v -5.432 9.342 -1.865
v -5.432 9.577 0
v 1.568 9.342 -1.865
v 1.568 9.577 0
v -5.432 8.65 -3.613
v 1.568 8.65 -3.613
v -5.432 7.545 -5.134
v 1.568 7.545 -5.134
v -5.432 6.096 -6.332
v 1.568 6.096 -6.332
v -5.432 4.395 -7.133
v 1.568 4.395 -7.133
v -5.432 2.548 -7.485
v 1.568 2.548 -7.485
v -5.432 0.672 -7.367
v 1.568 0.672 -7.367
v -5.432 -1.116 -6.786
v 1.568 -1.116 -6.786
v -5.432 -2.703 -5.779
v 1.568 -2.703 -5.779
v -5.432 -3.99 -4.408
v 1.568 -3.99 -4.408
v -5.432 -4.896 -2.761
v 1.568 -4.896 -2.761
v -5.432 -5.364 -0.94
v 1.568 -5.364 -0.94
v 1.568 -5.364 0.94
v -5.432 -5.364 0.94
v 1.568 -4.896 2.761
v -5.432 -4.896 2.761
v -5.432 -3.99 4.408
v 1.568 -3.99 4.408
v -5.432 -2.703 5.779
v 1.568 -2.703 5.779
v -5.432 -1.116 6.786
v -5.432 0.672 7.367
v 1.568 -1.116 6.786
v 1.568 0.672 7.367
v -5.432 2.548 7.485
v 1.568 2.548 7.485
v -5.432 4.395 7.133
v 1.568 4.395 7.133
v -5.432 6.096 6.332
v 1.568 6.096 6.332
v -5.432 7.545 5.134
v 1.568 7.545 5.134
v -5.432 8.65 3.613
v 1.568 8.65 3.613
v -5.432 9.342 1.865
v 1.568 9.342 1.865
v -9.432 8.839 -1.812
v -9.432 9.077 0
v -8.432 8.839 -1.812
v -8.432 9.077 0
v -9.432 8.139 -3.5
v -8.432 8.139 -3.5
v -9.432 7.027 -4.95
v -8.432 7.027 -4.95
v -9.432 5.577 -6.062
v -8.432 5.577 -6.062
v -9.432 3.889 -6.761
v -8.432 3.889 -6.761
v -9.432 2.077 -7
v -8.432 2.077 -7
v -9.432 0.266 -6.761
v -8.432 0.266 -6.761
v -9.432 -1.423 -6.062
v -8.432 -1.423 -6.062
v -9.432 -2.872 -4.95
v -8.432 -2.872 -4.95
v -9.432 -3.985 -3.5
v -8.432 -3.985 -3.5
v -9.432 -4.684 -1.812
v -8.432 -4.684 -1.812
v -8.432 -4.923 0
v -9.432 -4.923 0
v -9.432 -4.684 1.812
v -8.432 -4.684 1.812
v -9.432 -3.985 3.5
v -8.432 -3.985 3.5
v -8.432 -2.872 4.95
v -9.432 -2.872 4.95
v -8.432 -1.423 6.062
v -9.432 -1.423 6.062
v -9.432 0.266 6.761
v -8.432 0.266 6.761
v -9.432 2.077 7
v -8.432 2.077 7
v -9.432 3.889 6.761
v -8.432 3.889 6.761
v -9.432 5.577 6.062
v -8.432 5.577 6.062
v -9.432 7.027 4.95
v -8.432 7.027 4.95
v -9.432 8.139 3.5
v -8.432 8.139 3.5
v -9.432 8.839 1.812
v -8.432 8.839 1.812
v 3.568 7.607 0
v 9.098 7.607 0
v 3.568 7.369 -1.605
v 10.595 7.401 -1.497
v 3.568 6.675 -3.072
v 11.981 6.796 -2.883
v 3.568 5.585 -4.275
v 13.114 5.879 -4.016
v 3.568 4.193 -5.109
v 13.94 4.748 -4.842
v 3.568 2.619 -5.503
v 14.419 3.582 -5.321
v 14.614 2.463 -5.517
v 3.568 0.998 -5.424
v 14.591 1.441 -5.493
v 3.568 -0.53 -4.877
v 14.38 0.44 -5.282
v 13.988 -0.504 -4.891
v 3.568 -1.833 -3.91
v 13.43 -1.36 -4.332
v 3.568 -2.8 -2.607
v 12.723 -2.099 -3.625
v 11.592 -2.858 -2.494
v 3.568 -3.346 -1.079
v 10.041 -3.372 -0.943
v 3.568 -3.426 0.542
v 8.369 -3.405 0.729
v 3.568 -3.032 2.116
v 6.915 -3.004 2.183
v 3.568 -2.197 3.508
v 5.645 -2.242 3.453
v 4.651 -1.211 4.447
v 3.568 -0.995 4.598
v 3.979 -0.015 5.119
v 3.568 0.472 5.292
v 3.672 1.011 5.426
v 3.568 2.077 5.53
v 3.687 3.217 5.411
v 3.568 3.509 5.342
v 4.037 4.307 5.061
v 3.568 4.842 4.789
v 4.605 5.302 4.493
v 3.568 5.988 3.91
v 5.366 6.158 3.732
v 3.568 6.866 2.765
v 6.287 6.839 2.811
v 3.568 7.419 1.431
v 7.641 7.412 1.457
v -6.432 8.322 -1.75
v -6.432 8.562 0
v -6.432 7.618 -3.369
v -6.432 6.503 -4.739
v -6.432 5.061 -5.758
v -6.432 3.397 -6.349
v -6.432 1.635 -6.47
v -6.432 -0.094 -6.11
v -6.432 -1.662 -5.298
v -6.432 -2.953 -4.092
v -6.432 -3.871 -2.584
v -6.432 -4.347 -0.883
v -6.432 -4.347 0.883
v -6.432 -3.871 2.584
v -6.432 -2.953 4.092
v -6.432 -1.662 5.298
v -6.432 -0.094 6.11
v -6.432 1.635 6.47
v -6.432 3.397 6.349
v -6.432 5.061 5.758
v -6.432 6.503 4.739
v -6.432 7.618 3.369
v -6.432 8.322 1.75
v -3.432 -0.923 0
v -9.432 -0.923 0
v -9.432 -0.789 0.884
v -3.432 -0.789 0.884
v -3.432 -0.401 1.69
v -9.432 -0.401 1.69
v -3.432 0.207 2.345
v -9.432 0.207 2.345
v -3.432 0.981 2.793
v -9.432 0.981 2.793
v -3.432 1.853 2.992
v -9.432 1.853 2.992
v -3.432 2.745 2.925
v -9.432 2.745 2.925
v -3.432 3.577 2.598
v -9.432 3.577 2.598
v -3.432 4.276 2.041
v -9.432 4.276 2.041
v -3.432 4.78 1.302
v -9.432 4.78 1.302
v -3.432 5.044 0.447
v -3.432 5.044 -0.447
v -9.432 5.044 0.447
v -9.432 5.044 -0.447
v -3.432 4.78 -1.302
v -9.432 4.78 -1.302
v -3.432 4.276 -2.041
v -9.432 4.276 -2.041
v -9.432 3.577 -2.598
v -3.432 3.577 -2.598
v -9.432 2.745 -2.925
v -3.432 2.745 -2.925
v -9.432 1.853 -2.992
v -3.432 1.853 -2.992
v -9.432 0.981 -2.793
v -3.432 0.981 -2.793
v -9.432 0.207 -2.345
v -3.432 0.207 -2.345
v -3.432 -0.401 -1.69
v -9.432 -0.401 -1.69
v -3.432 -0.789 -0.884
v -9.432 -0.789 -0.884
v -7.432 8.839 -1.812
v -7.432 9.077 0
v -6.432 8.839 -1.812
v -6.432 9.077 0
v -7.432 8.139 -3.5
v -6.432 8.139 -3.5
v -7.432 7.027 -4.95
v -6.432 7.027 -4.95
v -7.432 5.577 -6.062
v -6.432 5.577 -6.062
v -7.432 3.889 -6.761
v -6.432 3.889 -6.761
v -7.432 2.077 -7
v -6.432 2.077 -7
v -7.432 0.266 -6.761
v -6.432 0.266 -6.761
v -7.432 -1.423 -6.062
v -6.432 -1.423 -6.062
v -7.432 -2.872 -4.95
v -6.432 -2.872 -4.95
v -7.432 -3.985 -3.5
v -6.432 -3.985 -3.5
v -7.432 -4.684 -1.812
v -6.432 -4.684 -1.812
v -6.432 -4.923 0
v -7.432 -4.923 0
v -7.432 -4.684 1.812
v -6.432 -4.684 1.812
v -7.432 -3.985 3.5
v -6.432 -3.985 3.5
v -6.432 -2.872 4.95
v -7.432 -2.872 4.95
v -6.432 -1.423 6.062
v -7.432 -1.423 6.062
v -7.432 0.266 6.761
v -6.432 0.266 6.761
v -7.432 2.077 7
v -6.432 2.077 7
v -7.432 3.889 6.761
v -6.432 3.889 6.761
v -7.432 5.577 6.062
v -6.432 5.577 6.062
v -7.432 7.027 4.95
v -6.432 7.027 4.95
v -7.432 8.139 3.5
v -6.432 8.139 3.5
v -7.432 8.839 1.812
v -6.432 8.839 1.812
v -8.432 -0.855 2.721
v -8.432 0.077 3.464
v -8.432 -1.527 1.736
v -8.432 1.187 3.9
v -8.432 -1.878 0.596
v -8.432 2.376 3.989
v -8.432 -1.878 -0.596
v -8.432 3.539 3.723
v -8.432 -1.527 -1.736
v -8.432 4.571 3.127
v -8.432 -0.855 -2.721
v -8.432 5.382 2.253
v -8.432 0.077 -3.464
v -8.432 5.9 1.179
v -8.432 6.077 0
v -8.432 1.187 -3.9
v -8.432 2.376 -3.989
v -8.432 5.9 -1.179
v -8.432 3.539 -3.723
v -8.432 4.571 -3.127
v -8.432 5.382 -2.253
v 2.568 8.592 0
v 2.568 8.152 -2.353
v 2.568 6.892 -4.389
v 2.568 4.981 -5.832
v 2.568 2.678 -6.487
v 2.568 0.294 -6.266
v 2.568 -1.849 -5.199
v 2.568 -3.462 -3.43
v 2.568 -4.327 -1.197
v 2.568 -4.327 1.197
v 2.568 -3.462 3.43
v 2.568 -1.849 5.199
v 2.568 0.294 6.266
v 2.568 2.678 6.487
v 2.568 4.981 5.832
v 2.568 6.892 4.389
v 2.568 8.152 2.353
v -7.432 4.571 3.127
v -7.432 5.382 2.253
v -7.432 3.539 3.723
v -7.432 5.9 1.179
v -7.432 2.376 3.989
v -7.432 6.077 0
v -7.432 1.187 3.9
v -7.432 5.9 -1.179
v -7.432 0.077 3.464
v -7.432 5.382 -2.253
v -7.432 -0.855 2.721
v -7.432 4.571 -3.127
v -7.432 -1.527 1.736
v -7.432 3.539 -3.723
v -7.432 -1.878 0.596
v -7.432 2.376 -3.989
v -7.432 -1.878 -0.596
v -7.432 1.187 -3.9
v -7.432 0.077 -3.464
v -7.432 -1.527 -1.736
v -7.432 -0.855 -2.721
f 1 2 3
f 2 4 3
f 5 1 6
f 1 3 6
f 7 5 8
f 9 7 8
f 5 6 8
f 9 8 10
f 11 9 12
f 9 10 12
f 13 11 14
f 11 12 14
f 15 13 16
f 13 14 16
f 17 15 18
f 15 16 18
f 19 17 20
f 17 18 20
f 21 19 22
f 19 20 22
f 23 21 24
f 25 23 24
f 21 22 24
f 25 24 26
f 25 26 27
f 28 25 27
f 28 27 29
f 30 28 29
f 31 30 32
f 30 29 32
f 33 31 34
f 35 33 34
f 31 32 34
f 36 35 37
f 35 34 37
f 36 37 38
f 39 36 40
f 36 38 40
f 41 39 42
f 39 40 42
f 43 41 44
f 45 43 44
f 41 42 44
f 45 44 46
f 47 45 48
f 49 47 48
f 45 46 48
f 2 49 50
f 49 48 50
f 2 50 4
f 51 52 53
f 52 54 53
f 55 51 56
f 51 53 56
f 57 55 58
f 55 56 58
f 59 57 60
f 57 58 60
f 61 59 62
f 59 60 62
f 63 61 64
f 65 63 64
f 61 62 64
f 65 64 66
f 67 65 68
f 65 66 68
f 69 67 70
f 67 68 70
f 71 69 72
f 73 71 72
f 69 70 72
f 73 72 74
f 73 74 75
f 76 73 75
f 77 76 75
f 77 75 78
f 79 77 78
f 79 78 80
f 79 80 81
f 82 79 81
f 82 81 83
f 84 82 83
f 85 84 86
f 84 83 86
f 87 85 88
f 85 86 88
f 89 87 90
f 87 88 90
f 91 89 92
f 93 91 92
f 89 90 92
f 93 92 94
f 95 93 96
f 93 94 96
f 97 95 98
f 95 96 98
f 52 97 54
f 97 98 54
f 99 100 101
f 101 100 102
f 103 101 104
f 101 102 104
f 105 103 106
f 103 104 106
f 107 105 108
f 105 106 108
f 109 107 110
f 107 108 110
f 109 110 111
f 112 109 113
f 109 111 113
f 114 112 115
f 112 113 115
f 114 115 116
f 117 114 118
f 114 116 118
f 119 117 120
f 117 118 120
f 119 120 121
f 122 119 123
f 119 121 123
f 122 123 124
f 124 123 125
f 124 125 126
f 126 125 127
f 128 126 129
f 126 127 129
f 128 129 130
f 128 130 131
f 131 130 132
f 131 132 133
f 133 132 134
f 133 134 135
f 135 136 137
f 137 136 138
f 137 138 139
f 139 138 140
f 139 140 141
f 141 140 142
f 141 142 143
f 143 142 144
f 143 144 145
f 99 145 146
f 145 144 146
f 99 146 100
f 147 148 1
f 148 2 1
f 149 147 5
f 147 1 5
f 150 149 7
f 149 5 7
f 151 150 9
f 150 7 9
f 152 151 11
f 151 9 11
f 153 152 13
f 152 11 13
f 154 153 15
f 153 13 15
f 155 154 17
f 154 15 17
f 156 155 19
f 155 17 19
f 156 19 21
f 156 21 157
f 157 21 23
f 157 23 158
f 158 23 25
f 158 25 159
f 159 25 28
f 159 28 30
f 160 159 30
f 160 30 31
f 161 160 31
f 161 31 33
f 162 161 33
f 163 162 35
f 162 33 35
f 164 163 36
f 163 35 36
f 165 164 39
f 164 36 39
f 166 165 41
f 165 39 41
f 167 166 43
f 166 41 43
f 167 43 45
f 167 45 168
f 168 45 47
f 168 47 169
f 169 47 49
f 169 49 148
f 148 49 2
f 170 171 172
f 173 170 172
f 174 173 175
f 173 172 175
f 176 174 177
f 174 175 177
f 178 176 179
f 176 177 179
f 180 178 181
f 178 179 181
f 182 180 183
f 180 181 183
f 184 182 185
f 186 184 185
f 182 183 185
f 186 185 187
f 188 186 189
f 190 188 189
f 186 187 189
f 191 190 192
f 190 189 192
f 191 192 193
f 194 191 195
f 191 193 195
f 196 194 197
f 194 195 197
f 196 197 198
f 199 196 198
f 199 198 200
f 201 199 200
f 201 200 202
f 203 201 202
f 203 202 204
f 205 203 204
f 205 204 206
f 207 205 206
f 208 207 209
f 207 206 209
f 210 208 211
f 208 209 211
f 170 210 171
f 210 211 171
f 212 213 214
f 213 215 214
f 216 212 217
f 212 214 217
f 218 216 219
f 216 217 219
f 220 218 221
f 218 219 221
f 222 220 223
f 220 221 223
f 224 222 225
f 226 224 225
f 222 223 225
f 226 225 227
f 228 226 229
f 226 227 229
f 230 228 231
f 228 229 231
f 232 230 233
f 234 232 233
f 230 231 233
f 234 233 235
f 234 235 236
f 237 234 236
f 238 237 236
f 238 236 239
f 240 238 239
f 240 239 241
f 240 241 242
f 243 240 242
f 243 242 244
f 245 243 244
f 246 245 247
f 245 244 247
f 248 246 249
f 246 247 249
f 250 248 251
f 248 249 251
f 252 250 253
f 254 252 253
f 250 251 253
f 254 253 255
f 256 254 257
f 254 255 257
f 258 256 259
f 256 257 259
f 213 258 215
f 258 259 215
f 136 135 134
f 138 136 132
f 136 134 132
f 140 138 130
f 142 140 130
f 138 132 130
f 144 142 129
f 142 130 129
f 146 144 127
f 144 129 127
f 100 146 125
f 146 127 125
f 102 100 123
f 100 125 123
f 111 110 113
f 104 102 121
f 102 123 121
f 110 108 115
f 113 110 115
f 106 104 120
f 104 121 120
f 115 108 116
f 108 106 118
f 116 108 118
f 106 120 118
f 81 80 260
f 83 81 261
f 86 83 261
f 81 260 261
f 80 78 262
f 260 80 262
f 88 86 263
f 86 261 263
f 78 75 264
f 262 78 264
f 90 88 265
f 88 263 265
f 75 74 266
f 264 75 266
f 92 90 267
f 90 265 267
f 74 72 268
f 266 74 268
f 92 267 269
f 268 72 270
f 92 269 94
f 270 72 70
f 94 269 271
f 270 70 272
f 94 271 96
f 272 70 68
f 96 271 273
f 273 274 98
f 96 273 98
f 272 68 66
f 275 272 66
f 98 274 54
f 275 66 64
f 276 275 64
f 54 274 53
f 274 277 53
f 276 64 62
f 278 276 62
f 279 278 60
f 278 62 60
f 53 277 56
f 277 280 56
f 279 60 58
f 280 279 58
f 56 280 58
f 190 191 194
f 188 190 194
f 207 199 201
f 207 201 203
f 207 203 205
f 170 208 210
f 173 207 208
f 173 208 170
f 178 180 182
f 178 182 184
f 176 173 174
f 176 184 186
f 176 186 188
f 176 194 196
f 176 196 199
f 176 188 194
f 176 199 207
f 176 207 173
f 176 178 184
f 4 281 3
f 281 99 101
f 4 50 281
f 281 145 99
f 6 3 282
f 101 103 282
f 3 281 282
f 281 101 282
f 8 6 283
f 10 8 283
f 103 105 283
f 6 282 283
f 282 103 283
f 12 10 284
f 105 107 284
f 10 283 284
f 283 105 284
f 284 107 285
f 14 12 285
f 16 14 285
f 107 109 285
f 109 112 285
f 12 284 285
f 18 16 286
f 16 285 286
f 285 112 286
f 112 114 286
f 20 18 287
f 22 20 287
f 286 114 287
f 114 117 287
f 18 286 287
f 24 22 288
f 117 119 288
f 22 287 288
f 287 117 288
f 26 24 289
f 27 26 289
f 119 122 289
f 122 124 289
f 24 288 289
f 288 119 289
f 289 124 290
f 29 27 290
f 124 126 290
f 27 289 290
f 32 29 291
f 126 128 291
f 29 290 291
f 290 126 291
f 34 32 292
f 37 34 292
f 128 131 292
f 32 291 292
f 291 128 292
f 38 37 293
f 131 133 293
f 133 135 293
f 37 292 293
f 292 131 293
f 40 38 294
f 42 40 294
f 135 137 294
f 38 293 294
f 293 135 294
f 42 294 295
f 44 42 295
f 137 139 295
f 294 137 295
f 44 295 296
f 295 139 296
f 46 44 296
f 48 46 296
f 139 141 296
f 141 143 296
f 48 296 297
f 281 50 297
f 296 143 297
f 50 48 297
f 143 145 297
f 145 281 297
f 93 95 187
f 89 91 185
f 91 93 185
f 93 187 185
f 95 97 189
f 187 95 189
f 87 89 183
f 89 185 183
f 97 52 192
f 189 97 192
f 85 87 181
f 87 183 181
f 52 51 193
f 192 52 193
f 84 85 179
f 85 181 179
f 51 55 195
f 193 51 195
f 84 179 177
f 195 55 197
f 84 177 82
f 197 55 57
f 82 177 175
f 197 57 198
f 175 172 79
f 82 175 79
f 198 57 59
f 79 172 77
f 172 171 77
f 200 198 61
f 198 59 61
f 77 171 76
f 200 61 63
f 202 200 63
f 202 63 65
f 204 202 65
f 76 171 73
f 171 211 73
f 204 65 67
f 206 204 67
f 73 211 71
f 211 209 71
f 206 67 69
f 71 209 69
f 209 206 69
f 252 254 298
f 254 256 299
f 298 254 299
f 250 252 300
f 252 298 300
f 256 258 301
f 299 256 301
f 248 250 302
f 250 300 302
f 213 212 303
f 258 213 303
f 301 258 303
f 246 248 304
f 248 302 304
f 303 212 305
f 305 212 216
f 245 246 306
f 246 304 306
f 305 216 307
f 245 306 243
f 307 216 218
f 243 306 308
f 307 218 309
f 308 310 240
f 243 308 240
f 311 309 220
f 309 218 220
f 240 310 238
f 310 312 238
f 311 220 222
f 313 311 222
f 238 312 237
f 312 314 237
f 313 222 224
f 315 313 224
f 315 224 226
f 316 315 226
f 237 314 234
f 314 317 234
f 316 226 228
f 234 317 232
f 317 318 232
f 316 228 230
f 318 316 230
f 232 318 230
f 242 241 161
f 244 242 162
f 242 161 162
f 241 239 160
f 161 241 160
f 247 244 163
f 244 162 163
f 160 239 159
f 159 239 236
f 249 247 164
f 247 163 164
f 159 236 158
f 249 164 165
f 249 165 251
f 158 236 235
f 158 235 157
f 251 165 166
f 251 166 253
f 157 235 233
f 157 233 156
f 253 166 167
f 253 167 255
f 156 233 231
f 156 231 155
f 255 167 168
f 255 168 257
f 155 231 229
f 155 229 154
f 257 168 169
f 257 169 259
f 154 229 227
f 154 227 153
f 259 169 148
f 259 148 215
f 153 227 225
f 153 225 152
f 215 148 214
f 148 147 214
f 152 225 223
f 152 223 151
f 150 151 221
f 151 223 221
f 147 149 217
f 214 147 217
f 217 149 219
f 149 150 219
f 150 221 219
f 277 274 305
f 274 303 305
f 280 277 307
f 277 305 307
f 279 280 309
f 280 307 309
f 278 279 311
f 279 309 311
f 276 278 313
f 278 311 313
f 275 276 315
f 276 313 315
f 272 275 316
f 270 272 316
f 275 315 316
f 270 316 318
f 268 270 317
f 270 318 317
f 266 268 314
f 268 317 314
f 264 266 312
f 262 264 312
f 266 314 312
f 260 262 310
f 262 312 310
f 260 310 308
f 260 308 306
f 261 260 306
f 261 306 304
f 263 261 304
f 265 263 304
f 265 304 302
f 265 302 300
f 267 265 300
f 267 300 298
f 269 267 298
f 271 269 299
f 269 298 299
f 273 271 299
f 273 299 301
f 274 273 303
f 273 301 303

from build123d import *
from build123d.topology import SkipClean

# Parameters (mm, degrees)
SKETCH_2_R               = 3
CUT_EXTRUDE_1_DEPTH      = 6
CUT_EXTRUDE_2_DEPTH      = 20.756862782
CUT_EXTRUDE_2_DEPTH_BACK = 20.756862782


with BuildPart() as part:
    # Эскиз1 → Повернуть1 (revolve)
    with BuildSketch(Plane.XY):
        Polygon((-9.432089165, 2.077253219), (-9.432089165, 9.077253219), (-8.432089165, 9.077253219), (-8.432089165, 6.077253219), (-7.432089165, 6.077253219), (-7.432089165, 9.077253219), (-6.432089165, 9.077253219), (-6.432089165, 8.562024792), (-5.432089165, 9.577253219), (1.567910835, 9.577253219), (3.567910835, 7.607253219), (15.567910835, 7.607253219), (15.567910835, 2.077253219), align=None)
    revolve(axis=Axis((15.567910835, 2.077253219, 0), (-1, 0, 0)))

    # Эскиз2 → Вырез-Вытянуть1 (cut)
    with BuildSketch(Plane.ZY.offset(9.432089165)):
        with Locations(Location((0, 2.077253219, 0), (0, 0, 270))):
            Circle(SKETCH_2_R)
    extrude(amount=-CUT_EXTRUDE_1_DEPTH, mode=Mode.SUBTRACT)

    # Эскиз3 → Вырез-Вытянуть2 (cut, two sides: drawn at the far end of the back side and taken through both)
    with SkipClean():  # the faces are left unmerged after this step: merging them gives an invalid solid
        with BuildSketch(Plane(origin=(0, 0, 0), x_dir=(1, 0, 0), z_dir=(0, 1, 0)).offset(-CUT_EXTRUDE_2_DEPTH_BACK)):
            Polygon((3.567910835, -5.53), (14.748858559, 5.650947724), (16.371941026, 5.650947724), (16.371941026, -6.819604623), (3.567910835, -5.789196512), align=None)
        extrude(amount=CUT_EXTRUDE_2_DEPTH + CUT_EXTRUDE_2_DEPTH_BACK, mode=Mode.SUBTRACT)


solid = part.part
